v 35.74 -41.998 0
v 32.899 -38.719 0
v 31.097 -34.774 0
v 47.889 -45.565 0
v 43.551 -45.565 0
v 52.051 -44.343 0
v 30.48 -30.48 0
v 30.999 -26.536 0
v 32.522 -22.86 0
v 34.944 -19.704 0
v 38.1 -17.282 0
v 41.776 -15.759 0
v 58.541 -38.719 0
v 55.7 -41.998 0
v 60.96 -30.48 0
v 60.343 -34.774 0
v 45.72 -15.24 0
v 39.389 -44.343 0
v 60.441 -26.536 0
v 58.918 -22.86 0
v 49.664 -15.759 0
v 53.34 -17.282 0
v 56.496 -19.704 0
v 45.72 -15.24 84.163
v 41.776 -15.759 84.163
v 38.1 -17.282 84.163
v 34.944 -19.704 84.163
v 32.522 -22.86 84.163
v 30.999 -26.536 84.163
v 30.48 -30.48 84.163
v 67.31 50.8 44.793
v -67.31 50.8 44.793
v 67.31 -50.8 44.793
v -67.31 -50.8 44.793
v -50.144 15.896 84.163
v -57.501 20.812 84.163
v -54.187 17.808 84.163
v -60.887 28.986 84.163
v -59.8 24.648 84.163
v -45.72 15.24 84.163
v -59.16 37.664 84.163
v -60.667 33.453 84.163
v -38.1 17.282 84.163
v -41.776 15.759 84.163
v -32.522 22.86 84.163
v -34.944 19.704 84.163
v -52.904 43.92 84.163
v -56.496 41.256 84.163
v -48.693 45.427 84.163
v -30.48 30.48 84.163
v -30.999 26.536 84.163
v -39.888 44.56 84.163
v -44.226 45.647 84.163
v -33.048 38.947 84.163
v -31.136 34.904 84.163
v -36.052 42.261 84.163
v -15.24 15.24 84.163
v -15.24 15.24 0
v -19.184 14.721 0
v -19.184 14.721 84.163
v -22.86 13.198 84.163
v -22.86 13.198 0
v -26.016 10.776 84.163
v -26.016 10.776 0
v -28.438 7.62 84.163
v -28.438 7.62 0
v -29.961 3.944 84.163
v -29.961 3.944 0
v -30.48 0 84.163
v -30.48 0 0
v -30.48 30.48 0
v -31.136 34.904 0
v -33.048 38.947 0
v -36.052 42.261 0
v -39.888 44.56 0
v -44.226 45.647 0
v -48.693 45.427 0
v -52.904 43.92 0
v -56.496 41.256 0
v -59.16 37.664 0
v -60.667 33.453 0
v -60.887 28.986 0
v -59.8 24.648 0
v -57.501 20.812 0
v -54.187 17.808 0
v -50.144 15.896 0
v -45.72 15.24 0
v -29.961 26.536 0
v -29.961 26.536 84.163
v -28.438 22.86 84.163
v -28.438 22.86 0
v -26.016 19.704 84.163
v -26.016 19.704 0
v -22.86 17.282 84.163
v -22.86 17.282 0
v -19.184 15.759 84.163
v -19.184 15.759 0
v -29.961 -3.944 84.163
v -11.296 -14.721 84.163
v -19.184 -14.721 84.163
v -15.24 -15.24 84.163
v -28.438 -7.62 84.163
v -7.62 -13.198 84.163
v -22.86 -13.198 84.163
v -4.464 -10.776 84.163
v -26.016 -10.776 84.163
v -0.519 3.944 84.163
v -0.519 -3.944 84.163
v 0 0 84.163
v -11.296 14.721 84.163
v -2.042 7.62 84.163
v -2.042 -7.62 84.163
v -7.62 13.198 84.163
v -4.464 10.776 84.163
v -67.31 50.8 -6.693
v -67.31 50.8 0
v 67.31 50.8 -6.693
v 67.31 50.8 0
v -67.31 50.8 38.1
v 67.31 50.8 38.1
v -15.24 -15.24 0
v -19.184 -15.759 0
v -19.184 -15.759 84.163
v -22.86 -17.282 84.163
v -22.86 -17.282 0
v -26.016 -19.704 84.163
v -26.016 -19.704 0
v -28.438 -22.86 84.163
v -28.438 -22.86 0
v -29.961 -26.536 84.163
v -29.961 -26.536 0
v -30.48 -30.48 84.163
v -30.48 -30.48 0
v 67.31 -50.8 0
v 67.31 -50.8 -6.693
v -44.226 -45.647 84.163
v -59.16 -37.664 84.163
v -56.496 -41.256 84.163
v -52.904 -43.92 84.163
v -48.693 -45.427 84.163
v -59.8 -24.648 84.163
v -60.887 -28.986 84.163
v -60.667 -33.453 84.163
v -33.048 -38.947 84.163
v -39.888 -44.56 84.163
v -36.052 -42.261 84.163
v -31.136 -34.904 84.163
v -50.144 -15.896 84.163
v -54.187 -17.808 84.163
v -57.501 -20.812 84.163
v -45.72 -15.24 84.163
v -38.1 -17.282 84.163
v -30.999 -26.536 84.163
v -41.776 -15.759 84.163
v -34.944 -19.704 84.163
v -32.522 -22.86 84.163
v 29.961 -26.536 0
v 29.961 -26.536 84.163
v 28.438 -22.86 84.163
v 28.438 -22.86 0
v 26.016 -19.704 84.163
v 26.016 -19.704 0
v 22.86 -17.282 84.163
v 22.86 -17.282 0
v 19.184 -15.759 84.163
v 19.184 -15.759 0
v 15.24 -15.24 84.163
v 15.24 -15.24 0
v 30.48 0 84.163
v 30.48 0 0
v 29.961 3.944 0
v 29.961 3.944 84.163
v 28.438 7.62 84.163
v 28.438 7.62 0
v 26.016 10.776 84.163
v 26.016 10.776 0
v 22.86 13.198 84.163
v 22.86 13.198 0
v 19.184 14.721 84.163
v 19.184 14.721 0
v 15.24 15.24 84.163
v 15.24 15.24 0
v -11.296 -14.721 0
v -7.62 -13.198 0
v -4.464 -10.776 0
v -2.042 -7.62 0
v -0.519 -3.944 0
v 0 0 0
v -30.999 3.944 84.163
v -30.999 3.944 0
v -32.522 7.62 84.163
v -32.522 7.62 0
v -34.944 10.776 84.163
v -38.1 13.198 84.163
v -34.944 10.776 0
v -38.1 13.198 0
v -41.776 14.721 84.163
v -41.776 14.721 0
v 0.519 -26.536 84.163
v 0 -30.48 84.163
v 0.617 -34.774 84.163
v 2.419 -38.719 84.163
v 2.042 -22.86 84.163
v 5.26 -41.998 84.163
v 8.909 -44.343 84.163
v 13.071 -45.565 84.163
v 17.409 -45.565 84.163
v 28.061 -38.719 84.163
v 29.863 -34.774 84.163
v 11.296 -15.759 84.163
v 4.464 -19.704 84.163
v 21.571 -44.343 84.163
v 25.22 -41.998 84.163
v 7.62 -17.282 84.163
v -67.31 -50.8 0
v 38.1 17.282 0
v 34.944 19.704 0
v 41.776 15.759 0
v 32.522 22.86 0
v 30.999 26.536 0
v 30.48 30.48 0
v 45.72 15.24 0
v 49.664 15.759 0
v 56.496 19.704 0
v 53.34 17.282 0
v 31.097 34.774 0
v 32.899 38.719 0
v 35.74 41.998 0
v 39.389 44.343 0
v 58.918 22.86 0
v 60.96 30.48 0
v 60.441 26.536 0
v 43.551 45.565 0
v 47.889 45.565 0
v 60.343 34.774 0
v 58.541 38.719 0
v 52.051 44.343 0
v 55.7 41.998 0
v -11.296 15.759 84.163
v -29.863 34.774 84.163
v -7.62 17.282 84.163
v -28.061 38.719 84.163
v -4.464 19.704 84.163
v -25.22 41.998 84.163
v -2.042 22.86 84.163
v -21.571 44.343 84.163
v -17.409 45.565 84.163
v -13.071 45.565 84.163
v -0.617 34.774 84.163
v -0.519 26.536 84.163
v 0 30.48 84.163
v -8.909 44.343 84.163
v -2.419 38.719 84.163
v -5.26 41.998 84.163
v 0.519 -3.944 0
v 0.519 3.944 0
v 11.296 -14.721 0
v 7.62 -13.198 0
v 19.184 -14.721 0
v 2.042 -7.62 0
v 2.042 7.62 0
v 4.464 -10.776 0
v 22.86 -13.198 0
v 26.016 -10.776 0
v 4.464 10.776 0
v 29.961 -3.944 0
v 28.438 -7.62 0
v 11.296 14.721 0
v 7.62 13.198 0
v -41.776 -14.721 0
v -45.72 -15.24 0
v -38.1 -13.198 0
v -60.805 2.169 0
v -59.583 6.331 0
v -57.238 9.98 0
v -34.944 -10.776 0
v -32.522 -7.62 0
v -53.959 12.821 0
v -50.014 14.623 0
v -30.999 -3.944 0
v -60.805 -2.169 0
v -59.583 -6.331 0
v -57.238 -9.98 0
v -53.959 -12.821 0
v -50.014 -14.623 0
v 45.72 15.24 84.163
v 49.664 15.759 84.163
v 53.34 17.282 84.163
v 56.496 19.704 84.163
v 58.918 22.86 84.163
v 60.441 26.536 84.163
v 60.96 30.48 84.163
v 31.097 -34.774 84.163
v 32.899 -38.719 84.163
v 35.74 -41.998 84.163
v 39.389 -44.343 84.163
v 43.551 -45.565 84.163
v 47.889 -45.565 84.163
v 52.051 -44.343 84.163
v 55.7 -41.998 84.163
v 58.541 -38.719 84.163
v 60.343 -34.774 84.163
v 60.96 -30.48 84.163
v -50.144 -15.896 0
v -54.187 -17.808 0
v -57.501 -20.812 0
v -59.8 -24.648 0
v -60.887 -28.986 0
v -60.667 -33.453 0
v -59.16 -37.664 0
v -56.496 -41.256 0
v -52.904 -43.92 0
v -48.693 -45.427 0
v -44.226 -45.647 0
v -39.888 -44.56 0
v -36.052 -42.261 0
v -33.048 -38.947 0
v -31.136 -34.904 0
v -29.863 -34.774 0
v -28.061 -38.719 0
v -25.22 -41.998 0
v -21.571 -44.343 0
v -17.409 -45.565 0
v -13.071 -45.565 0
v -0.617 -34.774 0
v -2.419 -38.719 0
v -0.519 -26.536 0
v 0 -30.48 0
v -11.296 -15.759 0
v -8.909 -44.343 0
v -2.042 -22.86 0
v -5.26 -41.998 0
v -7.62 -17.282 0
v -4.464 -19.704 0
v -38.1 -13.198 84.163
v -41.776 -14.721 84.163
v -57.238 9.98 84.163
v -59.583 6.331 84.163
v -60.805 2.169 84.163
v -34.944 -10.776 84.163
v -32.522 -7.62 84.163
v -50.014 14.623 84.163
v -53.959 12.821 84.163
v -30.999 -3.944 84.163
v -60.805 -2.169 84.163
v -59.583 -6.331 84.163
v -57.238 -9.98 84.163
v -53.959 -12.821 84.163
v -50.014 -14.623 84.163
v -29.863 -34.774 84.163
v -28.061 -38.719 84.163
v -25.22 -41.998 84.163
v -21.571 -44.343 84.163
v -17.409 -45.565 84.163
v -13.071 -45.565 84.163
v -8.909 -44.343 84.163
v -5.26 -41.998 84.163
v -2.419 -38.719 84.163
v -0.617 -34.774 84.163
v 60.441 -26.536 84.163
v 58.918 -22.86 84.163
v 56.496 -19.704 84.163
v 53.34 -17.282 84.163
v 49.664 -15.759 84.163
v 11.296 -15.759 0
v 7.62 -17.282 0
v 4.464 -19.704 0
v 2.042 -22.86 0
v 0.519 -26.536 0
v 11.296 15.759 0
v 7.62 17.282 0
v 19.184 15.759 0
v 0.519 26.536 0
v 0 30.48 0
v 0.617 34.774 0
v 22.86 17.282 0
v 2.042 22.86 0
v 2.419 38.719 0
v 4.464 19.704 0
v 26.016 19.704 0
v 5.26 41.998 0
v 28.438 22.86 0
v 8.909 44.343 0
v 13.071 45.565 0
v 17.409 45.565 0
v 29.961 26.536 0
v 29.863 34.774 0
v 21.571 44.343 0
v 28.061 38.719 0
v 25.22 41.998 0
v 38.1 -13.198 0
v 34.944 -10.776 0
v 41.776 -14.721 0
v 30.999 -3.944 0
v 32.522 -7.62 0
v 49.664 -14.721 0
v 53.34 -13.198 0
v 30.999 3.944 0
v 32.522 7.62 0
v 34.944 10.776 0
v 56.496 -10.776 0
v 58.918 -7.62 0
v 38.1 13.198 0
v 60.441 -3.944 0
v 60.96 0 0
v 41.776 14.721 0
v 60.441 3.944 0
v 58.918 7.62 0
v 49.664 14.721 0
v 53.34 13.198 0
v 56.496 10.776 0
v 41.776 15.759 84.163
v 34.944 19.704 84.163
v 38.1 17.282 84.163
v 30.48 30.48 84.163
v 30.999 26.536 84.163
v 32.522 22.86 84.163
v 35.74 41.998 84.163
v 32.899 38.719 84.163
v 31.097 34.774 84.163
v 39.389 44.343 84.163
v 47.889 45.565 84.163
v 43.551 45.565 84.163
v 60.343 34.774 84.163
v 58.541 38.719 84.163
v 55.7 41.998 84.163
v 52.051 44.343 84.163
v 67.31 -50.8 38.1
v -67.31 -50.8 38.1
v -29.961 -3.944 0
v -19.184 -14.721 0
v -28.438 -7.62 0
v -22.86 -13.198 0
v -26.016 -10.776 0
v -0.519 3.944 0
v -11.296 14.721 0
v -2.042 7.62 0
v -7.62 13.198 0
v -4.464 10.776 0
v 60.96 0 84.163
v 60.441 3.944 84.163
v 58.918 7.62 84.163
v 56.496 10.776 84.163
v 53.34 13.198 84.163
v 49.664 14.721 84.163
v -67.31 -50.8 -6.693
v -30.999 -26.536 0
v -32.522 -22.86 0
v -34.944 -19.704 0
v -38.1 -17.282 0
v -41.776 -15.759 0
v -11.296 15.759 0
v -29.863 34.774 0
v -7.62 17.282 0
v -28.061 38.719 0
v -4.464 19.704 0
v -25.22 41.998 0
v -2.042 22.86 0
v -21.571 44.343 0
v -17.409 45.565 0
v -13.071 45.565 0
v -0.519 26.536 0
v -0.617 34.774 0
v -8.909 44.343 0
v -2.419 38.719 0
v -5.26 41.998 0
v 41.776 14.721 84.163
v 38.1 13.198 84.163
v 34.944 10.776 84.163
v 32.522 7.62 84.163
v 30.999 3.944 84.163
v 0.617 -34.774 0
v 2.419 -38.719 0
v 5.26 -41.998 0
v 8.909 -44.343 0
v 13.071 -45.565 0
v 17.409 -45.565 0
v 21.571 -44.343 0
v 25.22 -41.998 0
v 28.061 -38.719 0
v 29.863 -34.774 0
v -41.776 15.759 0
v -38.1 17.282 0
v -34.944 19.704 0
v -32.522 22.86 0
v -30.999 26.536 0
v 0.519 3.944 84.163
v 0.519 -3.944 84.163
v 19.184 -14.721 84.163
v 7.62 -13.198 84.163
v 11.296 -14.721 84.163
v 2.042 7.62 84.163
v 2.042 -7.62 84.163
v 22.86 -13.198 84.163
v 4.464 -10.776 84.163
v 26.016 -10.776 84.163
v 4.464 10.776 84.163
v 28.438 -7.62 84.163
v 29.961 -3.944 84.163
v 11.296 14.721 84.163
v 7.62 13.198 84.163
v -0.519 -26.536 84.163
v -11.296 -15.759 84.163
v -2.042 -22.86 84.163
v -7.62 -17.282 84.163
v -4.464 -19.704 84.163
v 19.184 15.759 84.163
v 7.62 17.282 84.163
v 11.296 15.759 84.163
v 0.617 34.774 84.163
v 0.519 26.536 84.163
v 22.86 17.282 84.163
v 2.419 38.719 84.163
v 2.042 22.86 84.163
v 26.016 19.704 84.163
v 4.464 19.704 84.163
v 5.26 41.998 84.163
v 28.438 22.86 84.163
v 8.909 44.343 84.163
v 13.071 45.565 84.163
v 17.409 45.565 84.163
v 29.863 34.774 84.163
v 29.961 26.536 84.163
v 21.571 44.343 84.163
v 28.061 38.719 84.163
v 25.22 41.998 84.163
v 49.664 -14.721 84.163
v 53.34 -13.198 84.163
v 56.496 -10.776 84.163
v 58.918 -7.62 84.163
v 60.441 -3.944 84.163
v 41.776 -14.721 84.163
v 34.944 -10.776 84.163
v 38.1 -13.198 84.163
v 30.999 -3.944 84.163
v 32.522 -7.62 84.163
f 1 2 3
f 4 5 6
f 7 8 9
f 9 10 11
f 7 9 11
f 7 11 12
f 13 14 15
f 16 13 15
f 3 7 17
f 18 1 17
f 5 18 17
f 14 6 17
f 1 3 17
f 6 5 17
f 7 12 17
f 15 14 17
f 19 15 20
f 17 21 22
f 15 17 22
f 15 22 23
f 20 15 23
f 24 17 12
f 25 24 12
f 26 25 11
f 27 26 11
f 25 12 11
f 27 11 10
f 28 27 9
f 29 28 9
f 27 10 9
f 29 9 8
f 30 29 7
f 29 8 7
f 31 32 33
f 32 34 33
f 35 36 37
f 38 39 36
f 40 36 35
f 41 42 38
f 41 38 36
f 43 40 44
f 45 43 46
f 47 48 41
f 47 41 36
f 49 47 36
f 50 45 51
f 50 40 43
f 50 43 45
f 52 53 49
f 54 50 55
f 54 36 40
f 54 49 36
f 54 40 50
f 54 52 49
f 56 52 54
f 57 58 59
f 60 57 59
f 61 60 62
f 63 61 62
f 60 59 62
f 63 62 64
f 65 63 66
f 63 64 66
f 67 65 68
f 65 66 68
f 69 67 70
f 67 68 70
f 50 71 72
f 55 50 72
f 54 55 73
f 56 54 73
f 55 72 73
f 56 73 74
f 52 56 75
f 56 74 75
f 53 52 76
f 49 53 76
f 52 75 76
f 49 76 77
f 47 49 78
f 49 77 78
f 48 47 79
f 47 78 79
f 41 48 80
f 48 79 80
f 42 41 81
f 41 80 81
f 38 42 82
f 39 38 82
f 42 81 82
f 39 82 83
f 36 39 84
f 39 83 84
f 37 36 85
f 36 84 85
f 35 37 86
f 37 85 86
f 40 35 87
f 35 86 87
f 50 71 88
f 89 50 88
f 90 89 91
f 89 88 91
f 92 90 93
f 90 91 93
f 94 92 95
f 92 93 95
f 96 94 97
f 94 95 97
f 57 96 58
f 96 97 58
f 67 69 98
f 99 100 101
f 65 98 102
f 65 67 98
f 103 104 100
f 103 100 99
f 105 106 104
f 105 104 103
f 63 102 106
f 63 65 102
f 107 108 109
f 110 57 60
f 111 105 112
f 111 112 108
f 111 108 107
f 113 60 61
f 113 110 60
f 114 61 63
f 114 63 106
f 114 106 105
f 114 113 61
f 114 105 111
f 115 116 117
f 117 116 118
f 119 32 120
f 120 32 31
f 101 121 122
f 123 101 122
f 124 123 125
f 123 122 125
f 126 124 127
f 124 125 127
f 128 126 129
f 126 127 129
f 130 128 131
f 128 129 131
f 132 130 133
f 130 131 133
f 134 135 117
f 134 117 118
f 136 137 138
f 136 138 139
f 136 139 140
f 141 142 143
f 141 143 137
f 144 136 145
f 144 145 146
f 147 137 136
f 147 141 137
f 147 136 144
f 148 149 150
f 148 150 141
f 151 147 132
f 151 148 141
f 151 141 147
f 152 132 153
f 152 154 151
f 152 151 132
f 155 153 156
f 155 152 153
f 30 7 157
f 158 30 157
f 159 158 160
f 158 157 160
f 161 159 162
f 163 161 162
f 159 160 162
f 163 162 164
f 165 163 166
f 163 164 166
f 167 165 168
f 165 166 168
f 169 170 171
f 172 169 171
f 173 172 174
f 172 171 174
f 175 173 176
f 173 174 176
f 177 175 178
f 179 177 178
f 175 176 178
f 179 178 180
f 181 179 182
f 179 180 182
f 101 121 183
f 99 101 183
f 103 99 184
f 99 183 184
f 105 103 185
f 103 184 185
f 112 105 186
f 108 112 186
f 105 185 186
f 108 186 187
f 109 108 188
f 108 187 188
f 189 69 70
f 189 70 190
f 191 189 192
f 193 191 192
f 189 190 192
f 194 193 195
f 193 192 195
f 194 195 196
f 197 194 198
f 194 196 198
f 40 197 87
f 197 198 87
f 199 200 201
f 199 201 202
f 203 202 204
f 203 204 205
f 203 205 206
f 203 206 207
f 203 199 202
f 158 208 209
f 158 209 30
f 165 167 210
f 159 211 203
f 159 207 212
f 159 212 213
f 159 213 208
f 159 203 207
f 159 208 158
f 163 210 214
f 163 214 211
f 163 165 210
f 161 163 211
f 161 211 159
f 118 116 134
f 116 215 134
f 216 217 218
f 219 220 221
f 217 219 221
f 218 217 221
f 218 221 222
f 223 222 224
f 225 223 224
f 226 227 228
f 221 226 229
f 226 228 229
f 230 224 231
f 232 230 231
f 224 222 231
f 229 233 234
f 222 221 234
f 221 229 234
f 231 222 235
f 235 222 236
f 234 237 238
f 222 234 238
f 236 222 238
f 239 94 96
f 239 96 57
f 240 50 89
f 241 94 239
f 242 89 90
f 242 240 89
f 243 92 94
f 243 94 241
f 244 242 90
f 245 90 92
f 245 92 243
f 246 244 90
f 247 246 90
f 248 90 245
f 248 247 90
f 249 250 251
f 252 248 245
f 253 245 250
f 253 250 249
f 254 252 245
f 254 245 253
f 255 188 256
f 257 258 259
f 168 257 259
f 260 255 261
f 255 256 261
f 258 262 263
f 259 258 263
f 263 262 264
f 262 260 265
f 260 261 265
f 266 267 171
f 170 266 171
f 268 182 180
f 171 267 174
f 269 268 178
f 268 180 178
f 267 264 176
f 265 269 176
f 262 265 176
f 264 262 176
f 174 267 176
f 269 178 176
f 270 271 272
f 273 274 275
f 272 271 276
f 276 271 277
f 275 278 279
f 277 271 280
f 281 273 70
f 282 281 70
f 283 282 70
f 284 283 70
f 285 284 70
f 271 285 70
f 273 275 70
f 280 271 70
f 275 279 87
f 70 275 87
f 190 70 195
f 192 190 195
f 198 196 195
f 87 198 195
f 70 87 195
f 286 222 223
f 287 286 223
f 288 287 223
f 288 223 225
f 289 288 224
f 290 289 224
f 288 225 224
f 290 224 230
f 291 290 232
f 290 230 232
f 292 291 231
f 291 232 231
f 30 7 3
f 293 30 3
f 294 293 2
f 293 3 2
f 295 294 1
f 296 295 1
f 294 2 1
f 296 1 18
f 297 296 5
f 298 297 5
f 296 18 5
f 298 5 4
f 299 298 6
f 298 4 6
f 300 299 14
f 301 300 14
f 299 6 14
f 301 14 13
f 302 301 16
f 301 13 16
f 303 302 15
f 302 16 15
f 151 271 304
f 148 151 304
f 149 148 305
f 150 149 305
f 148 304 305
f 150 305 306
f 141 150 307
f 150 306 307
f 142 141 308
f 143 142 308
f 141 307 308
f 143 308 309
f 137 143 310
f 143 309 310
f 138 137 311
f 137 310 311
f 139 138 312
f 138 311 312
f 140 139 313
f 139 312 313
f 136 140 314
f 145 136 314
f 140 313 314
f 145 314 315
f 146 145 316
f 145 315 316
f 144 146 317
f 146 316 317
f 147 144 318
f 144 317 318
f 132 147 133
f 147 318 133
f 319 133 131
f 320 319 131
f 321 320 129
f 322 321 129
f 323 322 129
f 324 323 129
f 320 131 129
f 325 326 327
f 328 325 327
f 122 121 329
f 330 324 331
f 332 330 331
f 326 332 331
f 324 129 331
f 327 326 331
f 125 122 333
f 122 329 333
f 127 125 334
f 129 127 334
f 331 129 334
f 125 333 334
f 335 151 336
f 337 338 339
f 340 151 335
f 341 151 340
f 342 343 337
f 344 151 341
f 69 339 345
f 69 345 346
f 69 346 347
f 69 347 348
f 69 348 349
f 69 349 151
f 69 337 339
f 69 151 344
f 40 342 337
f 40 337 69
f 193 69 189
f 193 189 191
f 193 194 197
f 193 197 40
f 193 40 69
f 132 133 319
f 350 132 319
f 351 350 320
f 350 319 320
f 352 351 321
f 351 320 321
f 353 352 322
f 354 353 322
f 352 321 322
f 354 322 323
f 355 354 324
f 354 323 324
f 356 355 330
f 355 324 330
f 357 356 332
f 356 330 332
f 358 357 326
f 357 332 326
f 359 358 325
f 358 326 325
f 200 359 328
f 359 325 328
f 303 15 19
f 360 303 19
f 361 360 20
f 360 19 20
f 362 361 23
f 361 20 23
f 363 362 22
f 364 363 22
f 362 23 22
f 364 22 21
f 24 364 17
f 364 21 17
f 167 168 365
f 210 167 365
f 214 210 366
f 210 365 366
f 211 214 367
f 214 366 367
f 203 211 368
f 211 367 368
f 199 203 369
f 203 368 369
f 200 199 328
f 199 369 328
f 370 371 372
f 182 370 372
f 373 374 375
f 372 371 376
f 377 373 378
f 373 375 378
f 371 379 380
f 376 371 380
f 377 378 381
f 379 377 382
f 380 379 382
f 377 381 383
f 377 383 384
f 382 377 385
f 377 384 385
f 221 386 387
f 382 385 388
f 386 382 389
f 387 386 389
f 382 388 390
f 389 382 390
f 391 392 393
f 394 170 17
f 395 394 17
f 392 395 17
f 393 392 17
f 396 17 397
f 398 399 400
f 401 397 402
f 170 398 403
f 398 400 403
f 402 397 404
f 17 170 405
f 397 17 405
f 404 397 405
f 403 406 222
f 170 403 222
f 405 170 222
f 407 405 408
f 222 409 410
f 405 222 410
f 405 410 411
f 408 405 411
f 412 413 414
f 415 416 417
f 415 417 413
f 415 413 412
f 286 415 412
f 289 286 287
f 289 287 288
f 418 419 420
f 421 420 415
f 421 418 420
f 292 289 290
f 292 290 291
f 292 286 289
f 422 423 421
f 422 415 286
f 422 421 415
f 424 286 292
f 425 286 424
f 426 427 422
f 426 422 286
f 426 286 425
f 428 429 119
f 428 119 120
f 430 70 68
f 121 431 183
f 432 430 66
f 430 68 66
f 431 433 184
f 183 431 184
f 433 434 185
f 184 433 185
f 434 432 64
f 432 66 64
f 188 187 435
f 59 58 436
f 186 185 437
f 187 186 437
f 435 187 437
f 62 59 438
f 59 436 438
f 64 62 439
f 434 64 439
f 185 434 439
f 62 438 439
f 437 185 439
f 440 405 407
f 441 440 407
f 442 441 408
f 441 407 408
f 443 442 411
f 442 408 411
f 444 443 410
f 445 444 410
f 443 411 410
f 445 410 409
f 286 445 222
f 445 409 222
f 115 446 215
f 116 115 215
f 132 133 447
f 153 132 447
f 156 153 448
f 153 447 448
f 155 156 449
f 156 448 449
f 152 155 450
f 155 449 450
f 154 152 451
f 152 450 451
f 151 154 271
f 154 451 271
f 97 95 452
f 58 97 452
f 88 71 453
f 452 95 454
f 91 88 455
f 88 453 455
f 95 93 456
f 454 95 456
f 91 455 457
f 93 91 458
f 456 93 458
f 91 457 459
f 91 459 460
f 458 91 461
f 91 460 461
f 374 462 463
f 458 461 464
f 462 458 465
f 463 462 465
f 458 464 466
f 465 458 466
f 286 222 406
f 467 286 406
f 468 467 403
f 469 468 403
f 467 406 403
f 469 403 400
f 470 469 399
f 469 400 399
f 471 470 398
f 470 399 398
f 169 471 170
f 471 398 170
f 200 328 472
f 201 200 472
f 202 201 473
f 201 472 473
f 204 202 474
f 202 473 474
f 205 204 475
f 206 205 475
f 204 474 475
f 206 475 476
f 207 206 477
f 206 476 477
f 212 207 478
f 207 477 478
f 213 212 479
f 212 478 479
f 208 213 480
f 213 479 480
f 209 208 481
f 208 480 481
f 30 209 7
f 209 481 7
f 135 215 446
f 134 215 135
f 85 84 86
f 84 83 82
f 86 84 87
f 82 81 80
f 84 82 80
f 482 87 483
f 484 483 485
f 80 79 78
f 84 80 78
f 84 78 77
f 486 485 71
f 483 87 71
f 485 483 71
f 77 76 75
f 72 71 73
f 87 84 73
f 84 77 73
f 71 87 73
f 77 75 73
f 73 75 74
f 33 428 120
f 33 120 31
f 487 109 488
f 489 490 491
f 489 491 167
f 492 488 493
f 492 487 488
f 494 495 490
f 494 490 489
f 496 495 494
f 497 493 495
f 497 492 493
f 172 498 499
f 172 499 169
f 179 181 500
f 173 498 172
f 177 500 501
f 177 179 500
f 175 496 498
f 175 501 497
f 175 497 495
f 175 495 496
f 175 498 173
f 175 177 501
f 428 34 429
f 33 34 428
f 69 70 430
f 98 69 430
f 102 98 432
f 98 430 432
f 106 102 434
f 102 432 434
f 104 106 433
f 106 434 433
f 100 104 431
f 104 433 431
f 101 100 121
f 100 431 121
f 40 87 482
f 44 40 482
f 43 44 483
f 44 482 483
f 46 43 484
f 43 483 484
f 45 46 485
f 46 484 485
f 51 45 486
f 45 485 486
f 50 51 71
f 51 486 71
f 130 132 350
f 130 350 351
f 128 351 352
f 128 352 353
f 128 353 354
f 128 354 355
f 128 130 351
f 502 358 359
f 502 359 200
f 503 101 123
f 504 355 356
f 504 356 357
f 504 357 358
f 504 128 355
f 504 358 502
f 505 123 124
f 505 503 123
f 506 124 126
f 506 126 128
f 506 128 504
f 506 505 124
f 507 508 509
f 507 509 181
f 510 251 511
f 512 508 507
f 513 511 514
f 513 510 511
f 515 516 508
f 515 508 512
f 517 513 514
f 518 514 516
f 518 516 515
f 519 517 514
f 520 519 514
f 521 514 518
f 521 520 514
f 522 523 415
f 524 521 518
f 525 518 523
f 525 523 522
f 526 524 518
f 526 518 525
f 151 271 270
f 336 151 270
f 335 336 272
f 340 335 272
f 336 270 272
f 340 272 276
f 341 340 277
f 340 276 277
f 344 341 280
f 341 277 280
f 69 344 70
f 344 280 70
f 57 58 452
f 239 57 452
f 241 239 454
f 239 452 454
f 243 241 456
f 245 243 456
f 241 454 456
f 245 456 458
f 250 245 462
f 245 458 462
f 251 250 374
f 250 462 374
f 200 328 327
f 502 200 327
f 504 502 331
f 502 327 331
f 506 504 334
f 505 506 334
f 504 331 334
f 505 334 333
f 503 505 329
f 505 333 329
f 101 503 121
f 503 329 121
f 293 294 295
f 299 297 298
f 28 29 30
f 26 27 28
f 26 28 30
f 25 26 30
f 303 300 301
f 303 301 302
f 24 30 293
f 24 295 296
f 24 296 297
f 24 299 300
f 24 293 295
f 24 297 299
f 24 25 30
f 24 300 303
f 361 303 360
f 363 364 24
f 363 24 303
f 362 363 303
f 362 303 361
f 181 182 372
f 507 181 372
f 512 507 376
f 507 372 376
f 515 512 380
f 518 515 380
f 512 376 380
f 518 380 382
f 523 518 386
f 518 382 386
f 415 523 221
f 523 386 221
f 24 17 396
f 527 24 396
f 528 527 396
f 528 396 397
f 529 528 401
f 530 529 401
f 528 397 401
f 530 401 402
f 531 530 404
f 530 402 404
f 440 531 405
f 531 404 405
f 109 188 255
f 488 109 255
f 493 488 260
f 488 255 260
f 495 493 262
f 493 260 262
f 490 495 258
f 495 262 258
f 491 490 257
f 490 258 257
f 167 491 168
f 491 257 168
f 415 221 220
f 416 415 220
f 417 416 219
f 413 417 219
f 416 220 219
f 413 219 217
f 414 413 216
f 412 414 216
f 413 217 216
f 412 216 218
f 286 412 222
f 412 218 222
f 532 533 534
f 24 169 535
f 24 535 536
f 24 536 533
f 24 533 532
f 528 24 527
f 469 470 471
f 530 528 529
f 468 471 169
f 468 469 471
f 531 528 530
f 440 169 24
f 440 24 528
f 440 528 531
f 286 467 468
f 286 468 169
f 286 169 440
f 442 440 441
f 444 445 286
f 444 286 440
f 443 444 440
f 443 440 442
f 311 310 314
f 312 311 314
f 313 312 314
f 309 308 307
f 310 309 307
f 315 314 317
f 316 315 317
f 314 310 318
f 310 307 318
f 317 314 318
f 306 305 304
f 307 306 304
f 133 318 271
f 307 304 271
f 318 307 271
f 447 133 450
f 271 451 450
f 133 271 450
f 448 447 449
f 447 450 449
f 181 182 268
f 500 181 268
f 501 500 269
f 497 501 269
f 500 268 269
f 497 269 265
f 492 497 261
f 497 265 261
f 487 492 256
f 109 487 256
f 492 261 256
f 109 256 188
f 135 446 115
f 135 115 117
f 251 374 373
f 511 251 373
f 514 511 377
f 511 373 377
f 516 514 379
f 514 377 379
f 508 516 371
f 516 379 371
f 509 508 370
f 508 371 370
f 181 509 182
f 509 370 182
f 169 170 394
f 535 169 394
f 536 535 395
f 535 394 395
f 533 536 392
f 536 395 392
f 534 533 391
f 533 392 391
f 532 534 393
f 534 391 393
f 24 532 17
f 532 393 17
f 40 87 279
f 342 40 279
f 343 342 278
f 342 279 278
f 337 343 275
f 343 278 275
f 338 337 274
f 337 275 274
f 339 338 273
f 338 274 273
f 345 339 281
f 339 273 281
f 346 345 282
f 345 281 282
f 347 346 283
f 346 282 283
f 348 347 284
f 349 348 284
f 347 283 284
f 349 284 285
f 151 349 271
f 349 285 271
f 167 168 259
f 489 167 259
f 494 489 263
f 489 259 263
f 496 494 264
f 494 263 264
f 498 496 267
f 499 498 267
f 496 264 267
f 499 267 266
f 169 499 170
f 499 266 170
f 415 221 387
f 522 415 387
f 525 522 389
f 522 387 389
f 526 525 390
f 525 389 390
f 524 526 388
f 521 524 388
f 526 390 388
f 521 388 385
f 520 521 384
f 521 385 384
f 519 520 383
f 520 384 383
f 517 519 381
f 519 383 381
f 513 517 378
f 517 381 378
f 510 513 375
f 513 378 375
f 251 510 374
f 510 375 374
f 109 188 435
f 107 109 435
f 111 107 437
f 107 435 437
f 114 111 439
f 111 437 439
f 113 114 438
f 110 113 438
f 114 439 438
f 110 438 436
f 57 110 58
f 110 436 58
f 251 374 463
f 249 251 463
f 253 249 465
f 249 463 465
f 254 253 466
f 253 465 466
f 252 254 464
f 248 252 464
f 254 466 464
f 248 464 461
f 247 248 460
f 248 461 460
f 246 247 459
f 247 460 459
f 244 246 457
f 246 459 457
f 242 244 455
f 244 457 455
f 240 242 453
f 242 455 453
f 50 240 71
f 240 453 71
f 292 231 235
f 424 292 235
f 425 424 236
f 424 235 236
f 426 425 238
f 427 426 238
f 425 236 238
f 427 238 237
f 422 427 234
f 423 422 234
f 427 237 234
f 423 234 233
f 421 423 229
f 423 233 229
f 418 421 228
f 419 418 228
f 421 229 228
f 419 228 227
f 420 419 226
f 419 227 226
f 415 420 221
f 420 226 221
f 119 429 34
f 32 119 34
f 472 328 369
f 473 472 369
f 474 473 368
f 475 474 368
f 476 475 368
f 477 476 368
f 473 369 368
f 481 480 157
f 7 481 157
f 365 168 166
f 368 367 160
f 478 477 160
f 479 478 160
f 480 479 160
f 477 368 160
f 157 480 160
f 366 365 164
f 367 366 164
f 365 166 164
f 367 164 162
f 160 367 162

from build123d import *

# Parameters (mm, degrees)
F1_DEPTH = 84.1627984
F2_W     = 134.62
F2_H     = 6.6927933697
F3_DEPTH = 50.8
F2_H_2   = 6.6927984


# Not quite as in the source:
# - a feature names something its author has since deleted; it is built from what else it names


with BuildPart() as f1:
    # F0 (on Top) → F1 (new body)
    with BuildSketch(Plane.XY):
        with BuildLine():
            ThreePointArc((-45.72, -15.24), (-56.4963073453, -41.2563073453), (-30.48, -30.48))
            ThreePointArc((-30.48, -30.48), (-34.9436926547, -19.7036926547), (-45.72, -15.24))
        make_face()
    extrude(amount=F1_DEPTH)


with BuildPart() as f1b:
    # F0 (on Top) → F1, piece 2 (new body)
    with BuildSketch(Plane.XY):
        with BuildLine():
            ThreePointArc((-15.2399999801, -15.24), (-26.0163073382, -19.7036926477), (-30.48, -30.48))
            ThreePointArc((-30.48, -30.48), (-15.24, -45.72), (0, -30.48))
            ThreePointArc((0, -30.48), (-4.4636926477, -19.7036926618), (-15.2399999801, -15.24))
        make_face()
    extrude(amount=F1_DEPTH)


with BuildPart() as f1c:
    # F0 (on Top) → F1, piece 3 (new body)
    with BuildSketch(Plane.XY):
        with BuildLine():
            ThreePointArc((-45.72, 15.24), (-60.96, 0), (-45.72, -15.24))
            ThreePointArc((-45.72, -15.24), (-34.9436926547, -10.7763073453), (-30.48, 0))
            ThreePointArc((-30.48, 0), (-34.9436926547, 10.7763073453), (-45.72, 15.24))
        make_face()
    extrude(amount=F1_DEPTH)


with BuildPart() as f1d:
    # F0 (on Top) → F1, piece 4 (new body)
    with BuildSketch(Plane.XY):
        with BuildLine():
            ThreePointArc((15.2400000199, -15.24), (4.4636926618, -19.7036926477), (0, -30.48))
            ThreePointArc((0, -30.48), (15.24, -45.72), (30.48, -30.48))
            ThreePointArc((30.48, -30.48), (26.0163073523, -19.7036926618), (15.2400000199, -15.24))
        make_face()
    extrude(amount=F1_DEPTH)


with BuildPart() as f1e:
    # F0 (on Top) → F1, piece 5 (new body)
    with BuildSketch(Plane.XY):
        with BuildLine():
            ThreePointArc((-30.48, 0), (-26.0163073382, -10.7763073523), (-15.2399999801, -15.24))
            ThreePointArc((-15.2399999801, -15.24), (-4.4636926477, -10.7763073382), (0, 0))
            ThreePointArc((0, 0), (-4.4636926477, 10.7763073382), (-15.2399999801, 15.24))
            ThreePointArc((-15.2399999801, 15.24), (-26.0163073382, 10.7763073523), (-30.48, 0))
        make_face()
    extrude(amount=F1_DEPTH)


with BuildPart() as f1f:
    # F0 (on Top) → F1, piece 6 (new body)
    with BuildSketch(Plane.XY):
        with BuildLine():
            ThreePointArc((-30.48, 30.48), (-56.4963073453, 41.2563073453), (-45.72, 15.24))
            ThreePointArc((-45.72, 15.24), (-34.9436926547, 19.7036926547), (-30.48, 30.48))
        make_face()
    extrude(amount=F1_DEPTH)


with BuildPart() as f1g:
    # F0 (on Top) → F1, piece 7 (new body)
    with BuildSketch(Plane.XY):
        with BuildLine():
            ThreePointArc((45.7200000919, -15.24), (34.9436926872, -19.7036926222), (30.48, -30.48))
            ThreePointArc((30.48, -30.48), (45.72, -45.72), (60.96, -30.48))
            ThreePointArc((60.96, -30.48), (56.4963073778, -19.7036926872), (45.7200000919, -15.24))
        make_face()
    extrude(amount=F1_DEPTH)


with BuildPart() as f1h:
    # F0 (on Top) → F1, piece 8 (new body)
    with BuildSketch(Plane.XY):
        with BuildLine():
            ThreePointArc((0, 0), (4.4636926618, -10.7763073523), (15.2400000199, -15.24))
            ThreePointArc((15.2400000199, -15.24), (26.0163073523, -10.7763073382), (30.48, 0))
            ThreePointArc((30.48, 0), (26.0163073523, 10.7763073382), (15.2400000199, 15.24))
            ThreePointArc((15.2400000199, 15.24), (4.4636926618, 10.7763073523), (0, 0))
        make_face()
    extrude(amount=F1_DEPTH)


with BuildPart() as f1i:
    # F0 (on Top) → F1, piece 9 (new body)
    with BuildSketch(Plane.XY):
        with BuildLine():
            ThreePointArc((0, 30.48), (-15.24, 45.72), (-30.48, 30.48))
            ThreePointArc((-30.48, 30.48), (-26.0163073382, 19.7036926477), (-15.2399999801, 15.24))
            ThreePointArc((-15.2399999801, 15.24), (-4.4636926477, 19.7036926618), (0, 30.48))
        make_face()
    extrude(amount=F1_DEPTH)


with BuildPart() as f1j:
    # F0 (on Top) → F1, piece 10 (new body)
    with BuildSketch(Plane.XY):
        with BuildLine():
            ThreePointArc((30.48, 0), (34.9436926872, -10.7763073778), (45.7200000919, -15.24))
            ThreePointArc((45.7200000919, -15.24), (56.4963073778, -10.7763073128), (60.96, 0))
            ThreePointArc((60.96, 0), (56.4963073778, 10.7763073128), (45.7200000919, 15.24))
            ThreePointArc((45.7200000919, 15.24), (34.9436926872, 10.7763073778), (30.48, 0))
        make_face()
    extrude(amount=F1_DEPTH)


with BuildPart() as f1k:
    # F0 (on Top) → F1, piece 11 (new body)
    with BuildSketch(Plane.XY):
        with BuildLine():
            ThreePointArc((0, 30.48), (4.4636926618, 19.7036926477), (15.2400000199, 15.24))
            ThreePointArc((15.2400000199, 15.24), (26.0163073523, 19.7036926618), (30.48, 30.48))
            ThreePointArc((30.48, 30.48), (15.24, 45.72), (0, 30.48))
        make_face()
    extrude(amount=F1_DEPTH)


with BuildPart() as f1l:
    # F0 (on Top) → F1, piece 12 (new body)
    with BuildSketch(Plane.XY):
        with BuildLine():
            ThreePointArc((30.48, 30.48), (34.9436926872, 19.7036926222), (45.7200000919, 15.24))
            ThreePointArc((45.7200000919, 15.24), (56.4963073778, 19.7036926872), (60.96, 30.48))
            ThreePointArc((60.96, 30.48), (45.72, 45.72), (30.48, 30.48))
        make_face()
    extrude(amount=F1_DEPTH)


with BuildPart() as f3:
    # F2 (on Front) → F3 (new body, symmetric)
    with BuildSketch(Plane.XZ):
        with Locations((0, -3.3463966849)):
            Rectangle(F2_W, F2_H)
    extrude(amount=F3_DEPTH, both=True)


with BuildPart() as f3b:
    # F2 (on Front) → F3, piece 2 (new body, symmetric)
    with BuildSketch(Plane.XZ):
        with Locations((0, 41.4463992)):
            Rectangle(F2_W, F2_H_2)
    extrude(amount=F3_DEPTH, both=True)


solid = Compound([f1.part, f1b.part, f1c.part, f1d.part, f1e.part, f1f.part, f1g.part, f1h.part, f1i.part, f1j.part, f1k.part, f1l.part, f3.part, f3b.part])
